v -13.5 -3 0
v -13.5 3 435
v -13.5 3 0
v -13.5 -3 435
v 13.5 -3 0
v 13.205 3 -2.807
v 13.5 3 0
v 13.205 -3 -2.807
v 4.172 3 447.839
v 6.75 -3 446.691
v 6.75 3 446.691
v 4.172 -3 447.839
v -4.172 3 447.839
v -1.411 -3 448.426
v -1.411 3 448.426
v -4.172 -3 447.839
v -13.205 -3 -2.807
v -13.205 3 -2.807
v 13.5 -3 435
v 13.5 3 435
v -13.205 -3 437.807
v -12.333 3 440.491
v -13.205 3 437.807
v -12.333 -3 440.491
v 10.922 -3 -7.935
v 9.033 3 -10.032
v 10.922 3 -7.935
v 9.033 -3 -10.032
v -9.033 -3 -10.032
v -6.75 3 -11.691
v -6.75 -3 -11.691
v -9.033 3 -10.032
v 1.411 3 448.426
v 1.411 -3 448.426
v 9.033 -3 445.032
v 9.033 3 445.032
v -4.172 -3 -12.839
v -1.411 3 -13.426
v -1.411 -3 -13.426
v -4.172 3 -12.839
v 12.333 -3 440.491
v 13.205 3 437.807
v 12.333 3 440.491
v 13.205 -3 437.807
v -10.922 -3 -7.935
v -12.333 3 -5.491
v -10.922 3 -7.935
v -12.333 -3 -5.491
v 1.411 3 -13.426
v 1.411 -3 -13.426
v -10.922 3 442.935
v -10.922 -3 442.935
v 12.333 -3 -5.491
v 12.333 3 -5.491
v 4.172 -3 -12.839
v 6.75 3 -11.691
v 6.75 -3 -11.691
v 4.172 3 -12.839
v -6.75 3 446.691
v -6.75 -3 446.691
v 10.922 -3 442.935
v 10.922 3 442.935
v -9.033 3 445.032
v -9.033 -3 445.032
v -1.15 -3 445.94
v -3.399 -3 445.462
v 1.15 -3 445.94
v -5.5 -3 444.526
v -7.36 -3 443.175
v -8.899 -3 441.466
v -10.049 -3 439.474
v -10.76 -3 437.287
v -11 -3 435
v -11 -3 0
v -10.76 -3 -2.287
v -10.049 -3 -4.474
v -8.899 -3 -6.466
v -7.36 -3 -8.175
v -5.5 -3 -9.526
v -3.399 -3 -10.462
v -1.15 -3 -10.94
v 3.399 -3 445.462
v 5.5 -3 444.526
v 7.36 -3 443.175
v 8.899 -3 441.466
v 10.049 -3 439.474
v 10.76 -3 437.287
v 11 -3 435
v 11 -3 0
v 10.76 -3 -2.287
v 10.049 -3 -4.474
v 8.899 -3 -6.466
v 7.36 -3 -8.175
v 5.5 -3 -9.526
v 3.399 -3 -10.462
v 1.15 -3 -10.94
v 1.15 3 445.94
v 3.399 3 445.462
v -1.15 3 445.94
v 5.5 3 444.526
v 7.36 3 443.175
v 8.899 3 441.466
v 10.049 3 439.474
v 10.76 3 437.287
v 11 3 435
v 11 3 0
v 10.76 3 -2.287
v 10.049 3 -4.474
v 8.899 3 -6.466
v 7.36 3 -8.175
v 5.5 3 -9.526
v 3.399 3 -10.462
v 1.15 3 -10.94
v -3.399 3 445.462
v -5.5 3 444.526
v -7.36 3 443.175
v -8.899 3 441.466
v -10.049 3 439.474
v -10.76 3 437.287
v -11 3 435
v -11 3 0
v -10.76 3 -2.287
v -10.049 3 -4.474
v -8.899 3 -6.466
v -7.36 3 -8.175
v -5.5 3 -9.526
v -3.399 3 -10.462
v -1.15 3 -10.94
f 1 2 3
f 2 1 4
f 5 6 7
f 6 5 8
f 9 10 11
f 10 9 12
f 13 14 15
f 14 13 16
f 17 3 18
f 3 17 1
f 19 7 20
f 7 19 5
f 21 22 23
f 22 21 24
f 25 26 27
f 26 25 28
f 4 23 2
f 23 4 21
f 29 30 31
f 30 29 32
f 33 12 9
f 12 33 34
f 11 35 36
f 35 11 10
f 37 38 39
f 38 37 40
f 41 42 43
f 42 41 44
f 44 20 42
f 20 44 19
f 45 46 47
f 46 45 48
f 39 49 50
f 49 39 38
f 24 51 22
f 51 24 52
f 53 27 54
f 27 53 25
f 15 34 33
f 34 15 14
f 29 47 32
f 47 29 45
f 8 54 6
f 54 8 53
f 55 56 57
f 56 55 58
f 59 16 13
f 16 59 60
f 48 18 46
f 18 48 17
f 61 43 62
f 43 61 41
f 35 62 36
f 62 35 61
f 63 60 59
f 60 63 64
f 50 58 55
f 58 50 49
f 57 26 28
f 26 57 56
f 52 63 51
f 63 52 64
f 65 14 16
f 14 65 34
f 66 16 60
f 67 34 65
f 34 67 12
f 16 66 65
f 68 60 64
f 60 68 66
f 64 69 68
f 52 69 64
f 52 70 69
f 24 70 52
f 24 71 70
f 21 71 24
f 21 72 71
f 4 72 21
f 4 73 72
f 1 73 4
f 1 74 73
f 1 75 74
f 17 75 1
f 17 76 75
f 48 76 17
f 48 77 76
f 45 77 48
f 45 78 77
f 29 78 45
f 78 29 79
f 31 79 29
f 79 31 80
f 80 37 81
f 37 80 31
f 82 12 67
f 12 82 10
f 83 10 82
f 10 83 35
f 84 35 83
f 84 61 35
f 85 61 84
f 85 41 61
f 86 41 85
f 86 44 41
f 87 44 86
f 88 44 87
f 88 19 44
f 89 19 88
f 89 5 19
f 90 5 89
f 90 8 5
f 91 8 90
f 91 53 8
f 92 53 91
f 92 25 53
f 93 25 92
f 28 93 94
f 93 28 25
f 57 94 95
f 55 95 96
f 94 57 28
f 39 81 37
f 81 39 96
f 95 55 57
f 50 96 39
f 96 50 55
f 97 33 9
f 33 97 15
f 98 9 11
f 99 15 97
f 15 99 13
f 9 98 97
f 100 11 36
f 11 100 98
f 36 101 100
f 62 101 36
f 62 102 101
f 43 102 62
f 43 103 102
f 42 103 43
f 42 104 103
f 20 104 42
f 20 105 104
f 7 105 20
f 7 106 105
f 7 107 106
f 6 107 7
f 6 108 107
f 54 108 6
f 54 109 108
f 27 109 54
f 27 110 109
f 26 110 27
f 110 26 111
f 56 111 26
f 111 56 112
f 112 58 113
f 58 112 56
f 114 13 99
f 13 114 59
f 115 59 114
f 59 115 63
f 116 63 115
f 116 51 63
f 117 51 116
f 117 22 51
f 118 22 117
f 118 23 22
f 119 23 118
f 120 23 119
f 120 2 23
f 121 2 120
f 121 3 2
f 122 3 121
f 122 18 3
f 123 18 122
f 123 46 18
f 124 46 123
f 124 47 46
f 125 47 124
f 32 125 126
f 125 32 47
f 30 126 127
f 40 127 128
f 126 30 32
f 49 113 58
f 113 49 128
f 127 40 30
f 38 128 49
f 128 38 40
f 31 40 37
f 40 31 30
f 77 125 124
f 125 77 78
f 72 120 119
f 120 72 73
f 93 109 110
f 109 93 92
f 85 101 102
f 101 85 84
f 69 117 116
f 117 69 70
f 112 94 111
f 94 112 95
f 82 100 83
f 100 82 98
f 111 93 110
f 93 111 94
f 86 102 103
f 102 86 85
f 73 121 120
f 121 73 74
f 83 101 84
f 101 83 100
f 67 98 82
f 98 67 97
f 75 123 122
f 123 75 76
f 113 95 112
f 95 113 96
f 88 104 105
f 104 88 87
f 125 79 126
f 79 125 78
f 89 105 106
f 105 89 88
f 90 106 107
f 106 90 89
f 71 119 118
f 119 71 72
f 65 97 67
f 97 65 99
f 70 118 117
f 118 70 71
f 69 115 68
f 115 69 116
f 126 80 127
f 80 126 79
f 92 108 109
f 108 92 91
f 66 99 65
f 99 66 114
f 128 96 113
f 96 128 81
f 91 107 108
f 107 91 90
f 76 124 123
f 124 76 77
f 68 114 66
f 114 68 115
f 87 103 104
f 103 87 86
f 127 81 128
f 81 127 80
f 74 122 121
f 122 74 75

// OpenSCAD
//HTD3 belt

module belt(length) {
	color("dimgrey") rotate([90,0,0])difference() {
		hull() for (y=[0,length]) translate([0,y,0]) cylinder(h=6,r=22/2+2.5,center=true);
		hull() for (y=[0,length]) translate([0,y,0]) cylinder(h=10,r=22/2,center=true);
	}
}

belt(435);
